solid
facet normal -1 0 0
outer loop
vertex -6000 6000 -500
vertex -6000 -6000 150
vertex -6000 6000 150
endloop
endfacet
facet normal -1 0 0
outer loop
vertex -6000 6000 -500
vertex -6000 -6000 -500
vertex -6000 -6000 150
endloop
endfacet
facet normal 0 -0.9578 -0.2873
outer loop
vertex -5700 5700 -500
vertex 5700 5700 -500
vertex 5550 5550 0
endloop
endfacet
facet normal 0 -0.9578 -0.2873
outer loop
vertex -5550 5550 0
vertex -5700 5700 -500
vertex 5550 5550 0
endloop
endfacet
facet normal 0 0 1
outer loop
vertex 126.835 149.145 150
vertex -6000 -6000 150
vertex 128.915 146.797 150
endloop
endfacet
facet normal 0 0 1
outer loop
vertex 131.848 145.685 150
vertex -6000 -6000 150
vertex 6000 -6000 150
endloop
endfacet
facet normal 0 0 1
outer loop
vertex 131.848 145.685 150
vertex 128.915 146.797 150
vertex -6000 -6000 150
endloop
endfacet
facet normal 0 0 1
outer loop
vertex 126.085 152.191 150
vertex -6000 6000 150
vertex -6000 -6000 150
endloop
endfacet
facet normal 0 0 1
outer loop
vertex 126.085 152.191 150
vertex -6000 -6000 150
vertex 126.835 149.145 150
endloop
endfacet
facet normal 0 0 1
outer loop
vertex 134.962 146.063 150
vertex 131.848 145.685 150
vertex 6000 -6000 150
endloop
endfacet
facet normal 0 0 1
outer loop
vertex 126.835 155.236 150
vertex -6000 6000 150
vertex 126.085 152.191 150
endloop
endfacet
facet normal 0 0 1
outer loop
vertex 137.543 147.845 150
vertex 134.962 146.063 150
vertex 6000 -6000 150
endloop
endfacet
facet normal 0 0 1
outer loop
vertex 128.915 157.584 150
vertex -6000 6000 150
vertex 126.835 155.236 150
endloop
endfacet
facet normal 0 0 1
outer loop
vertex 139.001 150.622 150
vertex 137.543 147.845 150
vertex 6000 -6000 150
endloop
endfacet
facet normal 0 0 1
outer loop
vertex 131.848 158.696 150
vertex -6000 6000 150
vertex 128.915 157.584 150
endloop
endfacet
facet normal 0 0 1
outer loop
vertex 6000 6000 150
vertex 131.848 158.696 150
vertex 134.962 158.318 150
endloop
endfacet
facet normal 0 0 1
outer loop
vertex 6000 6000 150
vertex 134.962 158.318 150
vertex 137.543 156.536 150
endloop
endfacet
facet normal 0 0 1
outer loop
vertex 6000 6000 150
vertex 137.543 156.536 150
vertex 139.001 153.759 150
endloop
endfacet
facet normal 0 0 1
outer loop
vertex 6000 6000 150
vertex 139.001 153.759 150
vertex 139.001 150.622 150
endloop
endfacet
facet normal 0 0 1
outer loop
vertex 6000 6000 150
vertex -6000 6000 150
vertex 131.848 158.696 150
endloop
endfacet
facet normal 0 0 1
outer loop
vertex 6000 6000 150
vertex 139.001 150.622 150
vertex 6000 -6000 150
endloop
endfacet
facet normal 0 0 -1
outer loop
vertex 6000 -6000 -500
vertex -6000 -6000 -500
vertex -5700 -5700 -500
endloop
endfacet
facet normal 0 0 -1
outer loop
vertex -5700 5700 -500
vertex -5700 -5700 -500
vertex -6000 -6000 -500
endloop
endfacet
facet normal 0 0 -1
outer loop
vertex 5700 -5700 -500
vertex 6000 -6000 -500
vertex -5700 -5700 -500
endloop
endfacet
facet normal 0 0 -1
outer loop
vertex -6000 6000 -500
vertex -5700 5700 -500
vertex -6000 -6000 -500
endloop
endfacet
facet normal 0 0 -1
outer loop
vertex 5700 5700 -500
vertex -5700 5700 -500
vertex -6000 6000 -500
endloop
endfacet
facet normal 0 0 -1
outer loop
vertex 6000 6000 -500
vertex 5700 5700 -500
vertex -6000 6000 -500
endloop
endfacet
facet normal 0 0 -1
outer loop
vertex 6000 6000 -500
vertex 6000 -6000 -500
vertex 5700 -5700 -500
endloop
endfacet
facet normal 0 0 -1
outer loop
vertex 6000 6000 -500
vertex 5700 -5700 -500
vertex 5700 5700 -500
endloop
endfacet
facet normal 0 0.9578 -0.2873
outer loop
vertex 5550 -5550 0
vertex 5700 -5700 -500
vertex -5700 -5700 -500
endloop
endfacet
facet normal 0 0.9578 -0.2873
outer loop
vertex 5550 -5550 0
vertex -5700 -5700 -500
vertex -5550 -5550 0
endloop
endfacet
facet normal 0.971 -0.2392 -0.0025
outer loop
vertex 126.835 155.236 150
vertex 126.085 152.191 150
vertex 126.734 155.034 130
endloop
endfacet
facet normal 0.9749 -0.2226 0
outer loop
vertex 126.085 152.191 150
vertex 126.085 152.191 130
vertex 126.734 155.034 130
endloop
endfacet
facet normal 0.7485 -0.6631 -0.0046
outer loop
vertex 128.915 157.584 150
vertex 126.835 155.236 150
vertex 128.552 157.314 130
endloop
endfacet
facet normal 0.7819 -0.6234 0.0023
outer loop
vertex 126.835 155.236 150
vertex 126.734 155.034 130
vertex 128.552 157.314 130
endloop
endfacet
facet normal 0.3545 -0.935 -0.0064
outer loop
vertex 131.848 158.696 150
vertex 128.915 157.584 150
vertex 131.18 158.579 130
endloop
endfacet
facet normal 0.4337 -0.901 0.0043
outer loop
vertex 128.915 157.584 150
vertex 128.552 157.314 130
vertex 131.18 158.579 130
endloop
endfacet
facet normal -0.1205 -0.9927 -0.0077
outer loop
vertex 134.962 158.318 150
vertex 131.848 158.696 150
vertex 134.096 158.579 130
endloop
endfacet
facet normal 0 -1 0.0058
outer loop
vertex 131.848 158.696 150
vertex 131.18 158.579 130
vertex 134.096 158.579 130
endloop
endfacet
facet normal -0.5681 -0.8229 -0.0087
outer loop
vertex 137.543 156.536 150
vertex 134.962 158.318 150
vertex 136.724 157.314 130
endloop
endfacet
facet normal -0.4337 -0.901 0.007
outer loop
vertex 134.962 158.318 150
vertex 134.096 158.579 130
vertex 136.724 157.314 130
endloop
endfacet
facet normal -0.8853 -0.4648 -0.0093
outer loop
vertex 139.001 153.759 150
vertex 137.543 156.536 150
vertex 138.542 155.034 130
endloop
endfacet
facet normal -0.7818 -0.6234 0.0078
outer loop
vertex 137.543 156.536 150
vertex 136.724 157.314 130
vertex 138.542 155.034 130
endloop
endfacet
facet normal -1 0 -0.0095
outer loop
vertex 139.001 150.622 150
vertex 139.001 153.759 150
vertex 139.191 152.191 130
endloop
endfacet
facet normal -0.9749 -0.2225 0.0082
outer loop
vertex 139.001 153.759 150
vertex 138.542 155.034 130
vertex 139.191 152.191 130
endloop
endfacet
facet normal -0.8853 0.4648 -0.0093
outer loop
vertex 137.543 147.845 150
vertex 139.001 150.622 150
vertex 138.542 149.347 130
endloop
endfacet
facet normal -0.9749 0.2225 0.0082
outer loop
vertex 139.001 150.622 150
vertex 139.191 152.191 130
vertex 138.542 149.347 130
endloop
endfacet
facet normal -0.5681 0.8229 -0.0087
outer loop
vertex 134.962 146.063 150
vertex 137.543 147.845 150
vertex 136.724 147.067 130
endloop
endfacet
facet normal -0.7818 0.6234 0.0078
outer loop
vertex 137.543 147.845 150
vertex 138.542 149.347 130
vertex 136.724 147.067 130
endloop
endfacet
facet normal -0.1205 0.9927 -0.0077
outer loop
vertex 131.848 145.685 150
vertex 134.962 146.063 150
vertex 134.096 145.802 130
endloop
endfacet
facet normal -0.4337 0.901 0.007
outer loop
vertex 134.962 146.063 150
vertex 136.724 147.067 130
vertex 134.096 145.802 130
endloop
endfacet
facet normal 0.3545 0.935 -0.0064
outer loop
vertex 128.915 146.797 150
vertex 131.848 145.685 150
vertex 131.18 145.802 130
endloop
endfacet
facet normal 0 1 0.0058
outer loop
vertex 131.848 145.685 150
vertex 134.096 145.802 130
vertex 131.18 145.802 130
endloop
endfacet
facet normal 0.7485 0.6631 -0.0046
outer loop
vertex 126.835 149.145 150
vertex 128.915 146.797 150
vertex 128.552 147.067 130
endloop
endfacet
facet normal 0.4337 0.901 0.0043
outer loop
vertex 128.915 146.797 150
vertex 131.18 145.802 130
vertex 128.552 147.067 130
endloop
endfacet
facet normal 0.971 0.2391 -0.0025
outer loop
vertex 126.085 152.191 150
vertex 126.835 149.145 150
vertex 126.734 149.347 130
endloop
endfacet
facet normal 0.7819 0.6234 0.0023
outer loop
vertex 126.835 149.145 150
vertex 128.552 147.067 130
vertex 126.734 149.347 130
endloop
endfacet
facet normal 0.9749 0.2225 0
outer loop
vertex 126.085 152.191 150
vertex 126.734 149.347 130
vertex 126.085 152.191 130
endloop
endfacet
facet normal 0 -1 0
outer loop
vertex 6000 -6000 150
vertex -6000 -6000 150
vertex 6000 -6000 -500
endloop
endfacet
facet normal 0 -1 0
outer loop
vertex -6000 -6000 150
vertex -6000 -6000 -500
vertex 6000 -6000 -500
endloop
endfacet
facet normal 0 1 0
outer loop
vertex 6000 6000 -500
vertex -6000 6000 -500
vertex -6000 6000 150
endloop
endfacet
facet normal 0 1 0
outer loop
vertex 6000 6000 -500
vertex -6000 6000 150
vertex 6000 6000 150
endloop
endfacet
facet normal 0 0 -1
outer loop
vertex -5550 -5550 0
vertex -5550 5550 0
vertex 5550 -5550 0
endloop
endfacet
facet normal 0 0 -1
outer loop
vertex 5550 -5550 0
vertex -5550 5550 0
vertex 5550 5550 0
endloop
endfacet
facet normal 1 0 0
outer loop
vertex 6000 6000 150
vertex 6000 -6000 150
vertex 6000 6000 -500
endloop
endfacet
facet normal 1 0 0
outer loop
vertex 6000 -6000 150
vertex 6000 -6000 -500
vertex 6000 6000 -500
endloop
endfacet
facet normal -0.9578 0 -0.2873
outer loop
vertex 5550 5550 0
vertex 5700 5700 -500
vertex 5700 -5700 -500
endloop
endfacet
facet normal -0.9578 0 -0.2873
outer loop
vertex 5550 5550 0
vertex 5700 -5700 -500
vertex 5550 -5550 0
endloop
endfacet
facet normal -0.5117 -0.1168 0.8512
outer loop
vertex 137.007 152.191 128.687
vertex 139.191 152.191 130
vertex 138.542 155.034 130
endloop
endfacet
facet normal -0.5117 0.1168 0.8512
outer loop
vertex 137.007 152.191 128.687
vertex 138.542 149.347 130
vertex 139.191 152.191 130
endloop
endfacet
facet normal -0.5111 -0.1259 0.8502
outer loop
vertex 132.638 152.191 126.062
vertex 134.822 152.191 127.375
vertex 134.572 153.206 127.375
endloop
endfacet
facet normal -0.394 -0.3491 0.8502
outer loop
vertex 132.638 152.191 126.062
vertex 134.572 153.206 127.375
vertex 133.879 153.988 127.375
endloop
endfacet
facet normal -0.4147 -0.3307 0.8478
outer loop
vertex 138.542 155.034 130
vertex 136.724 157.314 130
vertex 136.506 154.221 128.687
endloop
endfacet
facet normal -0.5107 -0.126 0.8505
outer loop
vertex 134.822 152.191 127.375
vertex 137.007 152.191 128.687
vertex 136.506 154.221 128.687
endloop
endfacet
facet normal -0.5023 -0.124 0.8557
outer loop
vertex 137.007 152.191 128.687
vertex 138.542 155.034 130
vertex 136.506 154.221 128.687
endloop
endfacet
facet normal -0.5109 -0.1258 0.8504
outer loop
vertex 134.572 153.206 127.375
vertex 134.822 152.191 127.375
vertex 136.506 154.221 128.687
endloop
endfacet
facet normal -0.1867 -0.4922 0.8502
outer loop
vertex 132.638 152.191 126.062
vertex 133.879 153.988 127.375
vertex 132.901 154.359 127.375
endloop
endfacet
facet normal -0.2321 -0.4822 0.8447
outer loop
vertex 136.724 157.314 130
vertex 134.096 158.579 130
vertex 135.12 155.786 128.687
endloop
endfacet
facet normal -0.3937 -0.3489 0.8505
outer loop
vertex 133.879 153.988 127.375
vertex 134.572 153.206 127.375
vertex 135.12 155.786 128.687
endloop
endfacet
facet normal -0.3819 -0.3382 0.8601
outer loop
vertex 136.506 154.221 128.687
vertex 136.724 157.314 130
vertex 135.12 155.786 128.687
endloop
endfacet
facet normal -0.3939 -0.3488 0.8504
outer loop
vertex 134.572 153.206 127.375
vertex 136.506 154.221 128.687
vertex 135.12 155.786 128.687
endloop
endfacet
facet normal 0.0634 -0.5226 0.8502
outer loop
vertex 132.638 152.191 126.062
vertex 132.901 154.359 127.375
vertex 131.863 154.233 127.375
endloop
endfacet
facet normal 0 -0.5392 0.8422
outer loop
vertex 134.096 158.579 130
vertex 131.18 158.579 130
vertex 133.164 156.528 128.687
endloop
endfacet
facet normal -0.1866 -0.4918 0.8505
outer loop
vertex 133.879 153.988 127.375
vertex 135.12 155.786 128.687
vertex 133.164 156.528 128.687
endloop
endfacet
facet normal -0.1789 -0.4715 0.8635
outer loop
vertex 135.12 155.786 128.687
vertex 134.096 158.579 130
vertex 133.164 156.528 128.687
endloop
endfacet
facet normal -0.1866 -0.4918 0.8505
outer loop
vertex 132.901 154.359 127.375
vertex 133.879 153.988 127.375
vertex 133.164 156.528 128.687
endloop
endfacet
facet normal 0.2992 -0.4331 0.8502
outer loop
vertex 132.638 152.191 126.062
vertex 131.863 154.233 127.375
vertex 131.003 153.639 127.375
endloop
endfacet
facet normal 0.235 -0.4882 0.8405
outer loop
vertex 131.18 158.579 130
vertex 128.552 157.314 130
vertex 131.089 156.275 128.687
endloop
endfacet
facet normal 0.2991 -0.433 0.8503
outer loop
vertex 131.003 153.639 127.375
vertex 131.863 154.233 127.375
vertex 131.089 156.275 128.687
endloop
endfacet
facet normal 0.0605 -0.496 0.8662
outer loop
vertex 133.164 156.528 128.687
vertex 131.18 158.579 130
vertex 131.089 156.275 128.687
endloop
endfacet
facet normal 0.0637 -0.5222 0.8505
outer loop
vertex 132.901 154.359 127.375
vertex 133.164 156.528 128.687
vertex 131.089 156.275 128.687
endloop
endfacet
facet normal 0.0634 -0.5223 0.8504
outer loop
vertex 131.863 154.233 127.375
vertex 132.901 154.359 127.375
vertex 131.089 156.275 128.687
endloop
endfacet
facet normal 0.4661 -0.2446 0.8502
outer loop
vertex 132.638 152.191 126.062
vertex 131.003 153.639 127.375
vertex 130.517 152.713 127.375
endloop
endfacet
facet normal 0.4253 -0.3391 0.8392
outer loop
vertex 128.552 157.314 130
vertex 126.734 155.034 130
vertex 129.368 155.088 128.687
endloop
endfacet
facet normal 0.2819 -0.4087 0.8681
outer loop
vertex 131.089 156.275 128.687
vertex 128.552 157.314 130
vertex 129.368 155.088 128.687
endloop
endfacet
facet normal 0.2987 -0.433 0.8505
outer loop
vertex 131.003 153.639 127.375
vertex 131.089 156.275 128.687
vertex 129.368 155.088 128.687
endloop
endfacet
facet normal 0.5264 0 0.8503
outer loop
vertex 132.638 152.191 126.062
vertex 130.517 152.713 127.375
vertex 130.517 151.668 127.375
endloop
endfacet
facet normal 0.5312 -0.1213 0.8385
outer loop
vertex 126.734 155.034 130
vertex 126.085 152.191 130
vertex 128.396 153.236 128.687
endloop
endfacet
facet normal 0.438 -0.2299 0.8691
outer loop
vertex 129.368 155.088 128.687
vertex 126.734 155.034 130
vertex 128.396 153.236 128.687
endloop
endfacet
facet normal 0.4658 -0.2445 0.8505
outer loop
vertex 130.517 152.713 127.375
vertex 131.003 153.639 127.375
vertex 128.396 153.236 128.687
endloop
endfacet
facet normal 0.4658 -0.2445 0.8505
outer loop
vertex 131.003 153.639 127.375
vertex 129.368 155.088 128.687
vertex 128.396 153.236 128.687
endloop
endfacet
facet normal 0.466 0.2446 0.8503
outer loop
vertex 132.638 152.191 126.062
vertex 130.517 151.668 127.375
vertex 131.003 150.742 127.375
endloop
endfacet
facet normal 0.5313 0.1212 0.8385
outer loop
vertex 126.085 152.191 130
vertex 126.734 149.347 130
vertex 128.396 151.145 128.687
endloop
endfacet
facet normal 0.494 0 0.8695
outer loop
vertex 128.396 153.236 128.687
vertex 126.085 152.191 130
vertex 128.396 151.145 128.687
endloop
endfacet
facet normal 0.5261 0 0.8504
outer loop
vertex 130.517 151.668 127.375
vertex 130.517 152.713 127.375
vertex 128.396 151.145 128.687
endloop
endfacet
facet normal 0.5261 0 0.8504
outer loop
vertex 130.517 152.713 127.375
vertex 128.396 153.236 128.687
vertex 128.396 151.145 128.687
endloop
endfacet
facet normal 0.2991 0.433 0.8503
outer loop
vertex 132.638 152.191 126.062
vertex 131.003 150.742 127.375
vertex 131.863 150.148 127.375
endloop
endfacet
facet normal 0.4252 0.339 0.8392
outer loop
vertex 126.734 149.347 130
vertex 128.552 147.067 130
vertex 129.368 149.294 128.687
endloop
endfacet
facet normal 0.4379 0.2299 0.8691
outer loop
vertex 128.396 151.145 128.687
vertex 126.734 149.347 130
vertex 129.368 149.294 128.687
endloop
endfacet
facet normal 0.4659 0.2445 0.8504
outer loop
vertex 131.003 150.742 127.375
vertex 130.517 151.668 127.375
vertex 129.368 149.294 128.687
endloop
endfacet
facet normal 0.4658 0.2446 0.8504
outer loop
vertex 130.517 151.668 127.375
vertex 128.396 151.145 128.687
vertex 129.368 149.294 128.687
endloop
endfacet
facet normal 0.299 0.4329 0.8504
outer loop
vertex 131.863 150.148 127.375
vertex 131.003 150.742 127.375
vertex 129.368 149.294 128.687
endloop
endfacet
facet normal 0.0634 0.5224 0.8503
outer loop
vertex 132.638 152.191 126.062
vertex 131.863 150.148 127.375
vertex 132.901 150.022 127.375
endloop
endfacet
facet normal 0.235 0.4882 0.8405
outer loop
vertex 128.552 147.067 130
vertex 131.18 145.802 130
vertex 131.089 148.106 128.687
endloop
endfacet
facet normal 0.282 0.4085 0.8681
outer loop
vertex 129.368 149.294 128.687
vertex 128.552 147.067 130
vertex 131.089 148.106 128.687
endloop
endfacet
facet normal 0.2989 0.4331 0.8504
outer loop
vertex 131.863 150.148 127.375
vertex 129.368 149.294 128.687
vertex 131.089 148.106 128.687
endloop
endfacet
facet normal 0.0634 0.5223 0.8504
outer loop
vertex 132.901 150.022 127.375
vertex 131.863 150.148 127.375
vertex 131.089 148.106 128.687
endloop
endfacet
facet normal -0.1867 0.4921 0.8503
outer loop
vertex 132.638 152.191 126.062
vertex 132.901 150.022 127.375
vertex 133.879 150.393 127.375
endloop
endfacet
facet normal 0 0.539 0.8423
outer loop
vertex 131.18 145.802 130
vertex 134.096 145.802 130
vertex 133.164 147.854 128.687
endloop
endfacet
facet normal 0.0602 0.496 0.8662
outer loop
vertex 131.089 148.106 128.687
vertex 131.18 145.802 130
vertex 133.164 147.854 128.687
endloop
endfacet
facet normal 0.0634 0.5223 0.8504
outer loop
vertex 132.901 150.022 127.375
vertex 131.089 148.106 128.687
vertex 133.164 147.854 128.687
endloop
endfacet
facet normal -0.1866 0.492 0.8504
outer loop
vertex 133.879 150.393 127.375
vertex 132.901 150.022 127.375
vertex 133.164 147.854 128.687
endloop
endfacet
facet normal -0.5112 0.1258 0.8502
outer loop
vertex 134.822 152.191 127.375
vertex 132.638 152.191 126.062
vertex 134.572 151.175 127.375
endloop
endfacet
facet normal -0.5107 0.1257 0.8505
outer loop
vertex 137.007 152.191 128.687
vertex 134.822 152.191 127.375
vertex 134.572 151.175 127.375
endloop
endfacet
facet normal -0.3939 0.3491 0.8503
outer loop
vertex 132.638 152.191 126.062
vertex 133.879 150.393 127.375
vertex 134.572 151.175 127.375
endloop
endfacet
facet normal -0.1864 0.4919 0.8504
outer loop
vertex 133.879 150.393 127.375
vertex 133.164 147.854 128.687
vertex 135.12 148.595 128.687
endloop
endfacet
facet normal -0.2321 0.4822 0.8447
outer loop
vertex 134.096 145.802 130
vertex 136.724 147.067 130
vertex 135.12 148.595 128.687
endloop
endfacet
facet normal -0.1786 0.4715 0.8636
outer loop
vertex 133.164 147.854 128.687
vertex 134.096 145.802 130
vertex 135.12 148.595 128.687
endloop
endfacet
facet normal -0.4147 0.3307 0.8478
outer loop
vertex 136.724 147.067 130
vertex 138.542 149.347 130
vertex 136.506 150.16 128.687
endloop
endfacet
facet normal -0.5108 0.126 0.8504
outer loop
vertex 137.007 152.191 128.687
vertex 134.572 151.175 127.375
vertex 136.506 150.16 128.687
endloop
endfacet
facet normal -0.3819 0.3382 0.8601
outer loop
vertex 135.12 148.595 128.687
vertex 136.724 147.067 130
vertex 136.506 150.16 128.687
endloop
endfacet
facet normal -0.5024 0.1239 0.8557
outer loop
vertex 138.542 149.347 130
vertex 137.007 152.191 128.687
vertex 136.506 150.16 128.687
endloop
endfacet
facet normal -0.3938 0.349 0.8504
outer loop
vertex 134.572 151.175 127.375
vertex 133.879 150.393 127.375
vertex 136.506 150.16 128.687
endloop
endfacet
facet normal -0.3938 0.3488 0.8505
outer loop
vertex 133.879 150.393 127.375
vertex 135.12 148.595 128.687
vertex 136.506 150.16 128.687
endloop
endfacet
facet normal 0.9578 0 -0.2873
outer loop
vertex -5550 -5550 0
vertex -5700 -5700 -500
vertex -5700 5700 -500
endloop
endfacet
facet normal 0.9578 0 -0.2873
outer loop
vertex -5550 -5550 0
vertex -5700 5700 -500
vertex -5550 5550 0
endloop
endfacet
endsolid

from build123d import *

# Parameters (mm, degrees)
F0_W     = 12000
F0_H     = 12000
F3_DEPTH = 150
F5_D     = 13.1064
F5_DEPTH = 20
F5_TIP   = 3.9375598086


with BuildPart() as f2:
    # F2: sweep along a path in F0
    with BuildLine(Plane.XY) as f2_path:
        Line((-6000, -6000), (6000, -6000))
        Line((6000, -6000), (6000, 6000))
        Line((6000, 6000), (-6000, 6000))
        Line((-6000, 6000), (-6000, -6000))
    # F1 (on Right) → F2 (sweep)
    with BuildSketch(Plane.YZ):
        Polygon((-5550, 0), (-6000, 0), (-6000, -500), (-5700, -500), align=None)
    sweep(path=f2_path.line, transition=Transition.RIGHT)

    # F0 (on Top) → F3 (join)
    with BuildSketch(Plane.XY):
        Rectangle(F0_W, F0_H)
    extrude(amount=F3_DEPTH)

    # F5
    with Locations(Plane.XY.offset(150)):
        with Locations((132.6377540827, 152.1905660629)):
            Hole(F5_D / 2, depth=F5_DEPTH)
            with Locations((0, 0, -(F5_DEPTH + F5_TIP / 2))):  # 118° drill point
                Cone(0, F5_D / 2, F5_TIP, mode=Mode.SUBTRACT)


solid = f2.part
